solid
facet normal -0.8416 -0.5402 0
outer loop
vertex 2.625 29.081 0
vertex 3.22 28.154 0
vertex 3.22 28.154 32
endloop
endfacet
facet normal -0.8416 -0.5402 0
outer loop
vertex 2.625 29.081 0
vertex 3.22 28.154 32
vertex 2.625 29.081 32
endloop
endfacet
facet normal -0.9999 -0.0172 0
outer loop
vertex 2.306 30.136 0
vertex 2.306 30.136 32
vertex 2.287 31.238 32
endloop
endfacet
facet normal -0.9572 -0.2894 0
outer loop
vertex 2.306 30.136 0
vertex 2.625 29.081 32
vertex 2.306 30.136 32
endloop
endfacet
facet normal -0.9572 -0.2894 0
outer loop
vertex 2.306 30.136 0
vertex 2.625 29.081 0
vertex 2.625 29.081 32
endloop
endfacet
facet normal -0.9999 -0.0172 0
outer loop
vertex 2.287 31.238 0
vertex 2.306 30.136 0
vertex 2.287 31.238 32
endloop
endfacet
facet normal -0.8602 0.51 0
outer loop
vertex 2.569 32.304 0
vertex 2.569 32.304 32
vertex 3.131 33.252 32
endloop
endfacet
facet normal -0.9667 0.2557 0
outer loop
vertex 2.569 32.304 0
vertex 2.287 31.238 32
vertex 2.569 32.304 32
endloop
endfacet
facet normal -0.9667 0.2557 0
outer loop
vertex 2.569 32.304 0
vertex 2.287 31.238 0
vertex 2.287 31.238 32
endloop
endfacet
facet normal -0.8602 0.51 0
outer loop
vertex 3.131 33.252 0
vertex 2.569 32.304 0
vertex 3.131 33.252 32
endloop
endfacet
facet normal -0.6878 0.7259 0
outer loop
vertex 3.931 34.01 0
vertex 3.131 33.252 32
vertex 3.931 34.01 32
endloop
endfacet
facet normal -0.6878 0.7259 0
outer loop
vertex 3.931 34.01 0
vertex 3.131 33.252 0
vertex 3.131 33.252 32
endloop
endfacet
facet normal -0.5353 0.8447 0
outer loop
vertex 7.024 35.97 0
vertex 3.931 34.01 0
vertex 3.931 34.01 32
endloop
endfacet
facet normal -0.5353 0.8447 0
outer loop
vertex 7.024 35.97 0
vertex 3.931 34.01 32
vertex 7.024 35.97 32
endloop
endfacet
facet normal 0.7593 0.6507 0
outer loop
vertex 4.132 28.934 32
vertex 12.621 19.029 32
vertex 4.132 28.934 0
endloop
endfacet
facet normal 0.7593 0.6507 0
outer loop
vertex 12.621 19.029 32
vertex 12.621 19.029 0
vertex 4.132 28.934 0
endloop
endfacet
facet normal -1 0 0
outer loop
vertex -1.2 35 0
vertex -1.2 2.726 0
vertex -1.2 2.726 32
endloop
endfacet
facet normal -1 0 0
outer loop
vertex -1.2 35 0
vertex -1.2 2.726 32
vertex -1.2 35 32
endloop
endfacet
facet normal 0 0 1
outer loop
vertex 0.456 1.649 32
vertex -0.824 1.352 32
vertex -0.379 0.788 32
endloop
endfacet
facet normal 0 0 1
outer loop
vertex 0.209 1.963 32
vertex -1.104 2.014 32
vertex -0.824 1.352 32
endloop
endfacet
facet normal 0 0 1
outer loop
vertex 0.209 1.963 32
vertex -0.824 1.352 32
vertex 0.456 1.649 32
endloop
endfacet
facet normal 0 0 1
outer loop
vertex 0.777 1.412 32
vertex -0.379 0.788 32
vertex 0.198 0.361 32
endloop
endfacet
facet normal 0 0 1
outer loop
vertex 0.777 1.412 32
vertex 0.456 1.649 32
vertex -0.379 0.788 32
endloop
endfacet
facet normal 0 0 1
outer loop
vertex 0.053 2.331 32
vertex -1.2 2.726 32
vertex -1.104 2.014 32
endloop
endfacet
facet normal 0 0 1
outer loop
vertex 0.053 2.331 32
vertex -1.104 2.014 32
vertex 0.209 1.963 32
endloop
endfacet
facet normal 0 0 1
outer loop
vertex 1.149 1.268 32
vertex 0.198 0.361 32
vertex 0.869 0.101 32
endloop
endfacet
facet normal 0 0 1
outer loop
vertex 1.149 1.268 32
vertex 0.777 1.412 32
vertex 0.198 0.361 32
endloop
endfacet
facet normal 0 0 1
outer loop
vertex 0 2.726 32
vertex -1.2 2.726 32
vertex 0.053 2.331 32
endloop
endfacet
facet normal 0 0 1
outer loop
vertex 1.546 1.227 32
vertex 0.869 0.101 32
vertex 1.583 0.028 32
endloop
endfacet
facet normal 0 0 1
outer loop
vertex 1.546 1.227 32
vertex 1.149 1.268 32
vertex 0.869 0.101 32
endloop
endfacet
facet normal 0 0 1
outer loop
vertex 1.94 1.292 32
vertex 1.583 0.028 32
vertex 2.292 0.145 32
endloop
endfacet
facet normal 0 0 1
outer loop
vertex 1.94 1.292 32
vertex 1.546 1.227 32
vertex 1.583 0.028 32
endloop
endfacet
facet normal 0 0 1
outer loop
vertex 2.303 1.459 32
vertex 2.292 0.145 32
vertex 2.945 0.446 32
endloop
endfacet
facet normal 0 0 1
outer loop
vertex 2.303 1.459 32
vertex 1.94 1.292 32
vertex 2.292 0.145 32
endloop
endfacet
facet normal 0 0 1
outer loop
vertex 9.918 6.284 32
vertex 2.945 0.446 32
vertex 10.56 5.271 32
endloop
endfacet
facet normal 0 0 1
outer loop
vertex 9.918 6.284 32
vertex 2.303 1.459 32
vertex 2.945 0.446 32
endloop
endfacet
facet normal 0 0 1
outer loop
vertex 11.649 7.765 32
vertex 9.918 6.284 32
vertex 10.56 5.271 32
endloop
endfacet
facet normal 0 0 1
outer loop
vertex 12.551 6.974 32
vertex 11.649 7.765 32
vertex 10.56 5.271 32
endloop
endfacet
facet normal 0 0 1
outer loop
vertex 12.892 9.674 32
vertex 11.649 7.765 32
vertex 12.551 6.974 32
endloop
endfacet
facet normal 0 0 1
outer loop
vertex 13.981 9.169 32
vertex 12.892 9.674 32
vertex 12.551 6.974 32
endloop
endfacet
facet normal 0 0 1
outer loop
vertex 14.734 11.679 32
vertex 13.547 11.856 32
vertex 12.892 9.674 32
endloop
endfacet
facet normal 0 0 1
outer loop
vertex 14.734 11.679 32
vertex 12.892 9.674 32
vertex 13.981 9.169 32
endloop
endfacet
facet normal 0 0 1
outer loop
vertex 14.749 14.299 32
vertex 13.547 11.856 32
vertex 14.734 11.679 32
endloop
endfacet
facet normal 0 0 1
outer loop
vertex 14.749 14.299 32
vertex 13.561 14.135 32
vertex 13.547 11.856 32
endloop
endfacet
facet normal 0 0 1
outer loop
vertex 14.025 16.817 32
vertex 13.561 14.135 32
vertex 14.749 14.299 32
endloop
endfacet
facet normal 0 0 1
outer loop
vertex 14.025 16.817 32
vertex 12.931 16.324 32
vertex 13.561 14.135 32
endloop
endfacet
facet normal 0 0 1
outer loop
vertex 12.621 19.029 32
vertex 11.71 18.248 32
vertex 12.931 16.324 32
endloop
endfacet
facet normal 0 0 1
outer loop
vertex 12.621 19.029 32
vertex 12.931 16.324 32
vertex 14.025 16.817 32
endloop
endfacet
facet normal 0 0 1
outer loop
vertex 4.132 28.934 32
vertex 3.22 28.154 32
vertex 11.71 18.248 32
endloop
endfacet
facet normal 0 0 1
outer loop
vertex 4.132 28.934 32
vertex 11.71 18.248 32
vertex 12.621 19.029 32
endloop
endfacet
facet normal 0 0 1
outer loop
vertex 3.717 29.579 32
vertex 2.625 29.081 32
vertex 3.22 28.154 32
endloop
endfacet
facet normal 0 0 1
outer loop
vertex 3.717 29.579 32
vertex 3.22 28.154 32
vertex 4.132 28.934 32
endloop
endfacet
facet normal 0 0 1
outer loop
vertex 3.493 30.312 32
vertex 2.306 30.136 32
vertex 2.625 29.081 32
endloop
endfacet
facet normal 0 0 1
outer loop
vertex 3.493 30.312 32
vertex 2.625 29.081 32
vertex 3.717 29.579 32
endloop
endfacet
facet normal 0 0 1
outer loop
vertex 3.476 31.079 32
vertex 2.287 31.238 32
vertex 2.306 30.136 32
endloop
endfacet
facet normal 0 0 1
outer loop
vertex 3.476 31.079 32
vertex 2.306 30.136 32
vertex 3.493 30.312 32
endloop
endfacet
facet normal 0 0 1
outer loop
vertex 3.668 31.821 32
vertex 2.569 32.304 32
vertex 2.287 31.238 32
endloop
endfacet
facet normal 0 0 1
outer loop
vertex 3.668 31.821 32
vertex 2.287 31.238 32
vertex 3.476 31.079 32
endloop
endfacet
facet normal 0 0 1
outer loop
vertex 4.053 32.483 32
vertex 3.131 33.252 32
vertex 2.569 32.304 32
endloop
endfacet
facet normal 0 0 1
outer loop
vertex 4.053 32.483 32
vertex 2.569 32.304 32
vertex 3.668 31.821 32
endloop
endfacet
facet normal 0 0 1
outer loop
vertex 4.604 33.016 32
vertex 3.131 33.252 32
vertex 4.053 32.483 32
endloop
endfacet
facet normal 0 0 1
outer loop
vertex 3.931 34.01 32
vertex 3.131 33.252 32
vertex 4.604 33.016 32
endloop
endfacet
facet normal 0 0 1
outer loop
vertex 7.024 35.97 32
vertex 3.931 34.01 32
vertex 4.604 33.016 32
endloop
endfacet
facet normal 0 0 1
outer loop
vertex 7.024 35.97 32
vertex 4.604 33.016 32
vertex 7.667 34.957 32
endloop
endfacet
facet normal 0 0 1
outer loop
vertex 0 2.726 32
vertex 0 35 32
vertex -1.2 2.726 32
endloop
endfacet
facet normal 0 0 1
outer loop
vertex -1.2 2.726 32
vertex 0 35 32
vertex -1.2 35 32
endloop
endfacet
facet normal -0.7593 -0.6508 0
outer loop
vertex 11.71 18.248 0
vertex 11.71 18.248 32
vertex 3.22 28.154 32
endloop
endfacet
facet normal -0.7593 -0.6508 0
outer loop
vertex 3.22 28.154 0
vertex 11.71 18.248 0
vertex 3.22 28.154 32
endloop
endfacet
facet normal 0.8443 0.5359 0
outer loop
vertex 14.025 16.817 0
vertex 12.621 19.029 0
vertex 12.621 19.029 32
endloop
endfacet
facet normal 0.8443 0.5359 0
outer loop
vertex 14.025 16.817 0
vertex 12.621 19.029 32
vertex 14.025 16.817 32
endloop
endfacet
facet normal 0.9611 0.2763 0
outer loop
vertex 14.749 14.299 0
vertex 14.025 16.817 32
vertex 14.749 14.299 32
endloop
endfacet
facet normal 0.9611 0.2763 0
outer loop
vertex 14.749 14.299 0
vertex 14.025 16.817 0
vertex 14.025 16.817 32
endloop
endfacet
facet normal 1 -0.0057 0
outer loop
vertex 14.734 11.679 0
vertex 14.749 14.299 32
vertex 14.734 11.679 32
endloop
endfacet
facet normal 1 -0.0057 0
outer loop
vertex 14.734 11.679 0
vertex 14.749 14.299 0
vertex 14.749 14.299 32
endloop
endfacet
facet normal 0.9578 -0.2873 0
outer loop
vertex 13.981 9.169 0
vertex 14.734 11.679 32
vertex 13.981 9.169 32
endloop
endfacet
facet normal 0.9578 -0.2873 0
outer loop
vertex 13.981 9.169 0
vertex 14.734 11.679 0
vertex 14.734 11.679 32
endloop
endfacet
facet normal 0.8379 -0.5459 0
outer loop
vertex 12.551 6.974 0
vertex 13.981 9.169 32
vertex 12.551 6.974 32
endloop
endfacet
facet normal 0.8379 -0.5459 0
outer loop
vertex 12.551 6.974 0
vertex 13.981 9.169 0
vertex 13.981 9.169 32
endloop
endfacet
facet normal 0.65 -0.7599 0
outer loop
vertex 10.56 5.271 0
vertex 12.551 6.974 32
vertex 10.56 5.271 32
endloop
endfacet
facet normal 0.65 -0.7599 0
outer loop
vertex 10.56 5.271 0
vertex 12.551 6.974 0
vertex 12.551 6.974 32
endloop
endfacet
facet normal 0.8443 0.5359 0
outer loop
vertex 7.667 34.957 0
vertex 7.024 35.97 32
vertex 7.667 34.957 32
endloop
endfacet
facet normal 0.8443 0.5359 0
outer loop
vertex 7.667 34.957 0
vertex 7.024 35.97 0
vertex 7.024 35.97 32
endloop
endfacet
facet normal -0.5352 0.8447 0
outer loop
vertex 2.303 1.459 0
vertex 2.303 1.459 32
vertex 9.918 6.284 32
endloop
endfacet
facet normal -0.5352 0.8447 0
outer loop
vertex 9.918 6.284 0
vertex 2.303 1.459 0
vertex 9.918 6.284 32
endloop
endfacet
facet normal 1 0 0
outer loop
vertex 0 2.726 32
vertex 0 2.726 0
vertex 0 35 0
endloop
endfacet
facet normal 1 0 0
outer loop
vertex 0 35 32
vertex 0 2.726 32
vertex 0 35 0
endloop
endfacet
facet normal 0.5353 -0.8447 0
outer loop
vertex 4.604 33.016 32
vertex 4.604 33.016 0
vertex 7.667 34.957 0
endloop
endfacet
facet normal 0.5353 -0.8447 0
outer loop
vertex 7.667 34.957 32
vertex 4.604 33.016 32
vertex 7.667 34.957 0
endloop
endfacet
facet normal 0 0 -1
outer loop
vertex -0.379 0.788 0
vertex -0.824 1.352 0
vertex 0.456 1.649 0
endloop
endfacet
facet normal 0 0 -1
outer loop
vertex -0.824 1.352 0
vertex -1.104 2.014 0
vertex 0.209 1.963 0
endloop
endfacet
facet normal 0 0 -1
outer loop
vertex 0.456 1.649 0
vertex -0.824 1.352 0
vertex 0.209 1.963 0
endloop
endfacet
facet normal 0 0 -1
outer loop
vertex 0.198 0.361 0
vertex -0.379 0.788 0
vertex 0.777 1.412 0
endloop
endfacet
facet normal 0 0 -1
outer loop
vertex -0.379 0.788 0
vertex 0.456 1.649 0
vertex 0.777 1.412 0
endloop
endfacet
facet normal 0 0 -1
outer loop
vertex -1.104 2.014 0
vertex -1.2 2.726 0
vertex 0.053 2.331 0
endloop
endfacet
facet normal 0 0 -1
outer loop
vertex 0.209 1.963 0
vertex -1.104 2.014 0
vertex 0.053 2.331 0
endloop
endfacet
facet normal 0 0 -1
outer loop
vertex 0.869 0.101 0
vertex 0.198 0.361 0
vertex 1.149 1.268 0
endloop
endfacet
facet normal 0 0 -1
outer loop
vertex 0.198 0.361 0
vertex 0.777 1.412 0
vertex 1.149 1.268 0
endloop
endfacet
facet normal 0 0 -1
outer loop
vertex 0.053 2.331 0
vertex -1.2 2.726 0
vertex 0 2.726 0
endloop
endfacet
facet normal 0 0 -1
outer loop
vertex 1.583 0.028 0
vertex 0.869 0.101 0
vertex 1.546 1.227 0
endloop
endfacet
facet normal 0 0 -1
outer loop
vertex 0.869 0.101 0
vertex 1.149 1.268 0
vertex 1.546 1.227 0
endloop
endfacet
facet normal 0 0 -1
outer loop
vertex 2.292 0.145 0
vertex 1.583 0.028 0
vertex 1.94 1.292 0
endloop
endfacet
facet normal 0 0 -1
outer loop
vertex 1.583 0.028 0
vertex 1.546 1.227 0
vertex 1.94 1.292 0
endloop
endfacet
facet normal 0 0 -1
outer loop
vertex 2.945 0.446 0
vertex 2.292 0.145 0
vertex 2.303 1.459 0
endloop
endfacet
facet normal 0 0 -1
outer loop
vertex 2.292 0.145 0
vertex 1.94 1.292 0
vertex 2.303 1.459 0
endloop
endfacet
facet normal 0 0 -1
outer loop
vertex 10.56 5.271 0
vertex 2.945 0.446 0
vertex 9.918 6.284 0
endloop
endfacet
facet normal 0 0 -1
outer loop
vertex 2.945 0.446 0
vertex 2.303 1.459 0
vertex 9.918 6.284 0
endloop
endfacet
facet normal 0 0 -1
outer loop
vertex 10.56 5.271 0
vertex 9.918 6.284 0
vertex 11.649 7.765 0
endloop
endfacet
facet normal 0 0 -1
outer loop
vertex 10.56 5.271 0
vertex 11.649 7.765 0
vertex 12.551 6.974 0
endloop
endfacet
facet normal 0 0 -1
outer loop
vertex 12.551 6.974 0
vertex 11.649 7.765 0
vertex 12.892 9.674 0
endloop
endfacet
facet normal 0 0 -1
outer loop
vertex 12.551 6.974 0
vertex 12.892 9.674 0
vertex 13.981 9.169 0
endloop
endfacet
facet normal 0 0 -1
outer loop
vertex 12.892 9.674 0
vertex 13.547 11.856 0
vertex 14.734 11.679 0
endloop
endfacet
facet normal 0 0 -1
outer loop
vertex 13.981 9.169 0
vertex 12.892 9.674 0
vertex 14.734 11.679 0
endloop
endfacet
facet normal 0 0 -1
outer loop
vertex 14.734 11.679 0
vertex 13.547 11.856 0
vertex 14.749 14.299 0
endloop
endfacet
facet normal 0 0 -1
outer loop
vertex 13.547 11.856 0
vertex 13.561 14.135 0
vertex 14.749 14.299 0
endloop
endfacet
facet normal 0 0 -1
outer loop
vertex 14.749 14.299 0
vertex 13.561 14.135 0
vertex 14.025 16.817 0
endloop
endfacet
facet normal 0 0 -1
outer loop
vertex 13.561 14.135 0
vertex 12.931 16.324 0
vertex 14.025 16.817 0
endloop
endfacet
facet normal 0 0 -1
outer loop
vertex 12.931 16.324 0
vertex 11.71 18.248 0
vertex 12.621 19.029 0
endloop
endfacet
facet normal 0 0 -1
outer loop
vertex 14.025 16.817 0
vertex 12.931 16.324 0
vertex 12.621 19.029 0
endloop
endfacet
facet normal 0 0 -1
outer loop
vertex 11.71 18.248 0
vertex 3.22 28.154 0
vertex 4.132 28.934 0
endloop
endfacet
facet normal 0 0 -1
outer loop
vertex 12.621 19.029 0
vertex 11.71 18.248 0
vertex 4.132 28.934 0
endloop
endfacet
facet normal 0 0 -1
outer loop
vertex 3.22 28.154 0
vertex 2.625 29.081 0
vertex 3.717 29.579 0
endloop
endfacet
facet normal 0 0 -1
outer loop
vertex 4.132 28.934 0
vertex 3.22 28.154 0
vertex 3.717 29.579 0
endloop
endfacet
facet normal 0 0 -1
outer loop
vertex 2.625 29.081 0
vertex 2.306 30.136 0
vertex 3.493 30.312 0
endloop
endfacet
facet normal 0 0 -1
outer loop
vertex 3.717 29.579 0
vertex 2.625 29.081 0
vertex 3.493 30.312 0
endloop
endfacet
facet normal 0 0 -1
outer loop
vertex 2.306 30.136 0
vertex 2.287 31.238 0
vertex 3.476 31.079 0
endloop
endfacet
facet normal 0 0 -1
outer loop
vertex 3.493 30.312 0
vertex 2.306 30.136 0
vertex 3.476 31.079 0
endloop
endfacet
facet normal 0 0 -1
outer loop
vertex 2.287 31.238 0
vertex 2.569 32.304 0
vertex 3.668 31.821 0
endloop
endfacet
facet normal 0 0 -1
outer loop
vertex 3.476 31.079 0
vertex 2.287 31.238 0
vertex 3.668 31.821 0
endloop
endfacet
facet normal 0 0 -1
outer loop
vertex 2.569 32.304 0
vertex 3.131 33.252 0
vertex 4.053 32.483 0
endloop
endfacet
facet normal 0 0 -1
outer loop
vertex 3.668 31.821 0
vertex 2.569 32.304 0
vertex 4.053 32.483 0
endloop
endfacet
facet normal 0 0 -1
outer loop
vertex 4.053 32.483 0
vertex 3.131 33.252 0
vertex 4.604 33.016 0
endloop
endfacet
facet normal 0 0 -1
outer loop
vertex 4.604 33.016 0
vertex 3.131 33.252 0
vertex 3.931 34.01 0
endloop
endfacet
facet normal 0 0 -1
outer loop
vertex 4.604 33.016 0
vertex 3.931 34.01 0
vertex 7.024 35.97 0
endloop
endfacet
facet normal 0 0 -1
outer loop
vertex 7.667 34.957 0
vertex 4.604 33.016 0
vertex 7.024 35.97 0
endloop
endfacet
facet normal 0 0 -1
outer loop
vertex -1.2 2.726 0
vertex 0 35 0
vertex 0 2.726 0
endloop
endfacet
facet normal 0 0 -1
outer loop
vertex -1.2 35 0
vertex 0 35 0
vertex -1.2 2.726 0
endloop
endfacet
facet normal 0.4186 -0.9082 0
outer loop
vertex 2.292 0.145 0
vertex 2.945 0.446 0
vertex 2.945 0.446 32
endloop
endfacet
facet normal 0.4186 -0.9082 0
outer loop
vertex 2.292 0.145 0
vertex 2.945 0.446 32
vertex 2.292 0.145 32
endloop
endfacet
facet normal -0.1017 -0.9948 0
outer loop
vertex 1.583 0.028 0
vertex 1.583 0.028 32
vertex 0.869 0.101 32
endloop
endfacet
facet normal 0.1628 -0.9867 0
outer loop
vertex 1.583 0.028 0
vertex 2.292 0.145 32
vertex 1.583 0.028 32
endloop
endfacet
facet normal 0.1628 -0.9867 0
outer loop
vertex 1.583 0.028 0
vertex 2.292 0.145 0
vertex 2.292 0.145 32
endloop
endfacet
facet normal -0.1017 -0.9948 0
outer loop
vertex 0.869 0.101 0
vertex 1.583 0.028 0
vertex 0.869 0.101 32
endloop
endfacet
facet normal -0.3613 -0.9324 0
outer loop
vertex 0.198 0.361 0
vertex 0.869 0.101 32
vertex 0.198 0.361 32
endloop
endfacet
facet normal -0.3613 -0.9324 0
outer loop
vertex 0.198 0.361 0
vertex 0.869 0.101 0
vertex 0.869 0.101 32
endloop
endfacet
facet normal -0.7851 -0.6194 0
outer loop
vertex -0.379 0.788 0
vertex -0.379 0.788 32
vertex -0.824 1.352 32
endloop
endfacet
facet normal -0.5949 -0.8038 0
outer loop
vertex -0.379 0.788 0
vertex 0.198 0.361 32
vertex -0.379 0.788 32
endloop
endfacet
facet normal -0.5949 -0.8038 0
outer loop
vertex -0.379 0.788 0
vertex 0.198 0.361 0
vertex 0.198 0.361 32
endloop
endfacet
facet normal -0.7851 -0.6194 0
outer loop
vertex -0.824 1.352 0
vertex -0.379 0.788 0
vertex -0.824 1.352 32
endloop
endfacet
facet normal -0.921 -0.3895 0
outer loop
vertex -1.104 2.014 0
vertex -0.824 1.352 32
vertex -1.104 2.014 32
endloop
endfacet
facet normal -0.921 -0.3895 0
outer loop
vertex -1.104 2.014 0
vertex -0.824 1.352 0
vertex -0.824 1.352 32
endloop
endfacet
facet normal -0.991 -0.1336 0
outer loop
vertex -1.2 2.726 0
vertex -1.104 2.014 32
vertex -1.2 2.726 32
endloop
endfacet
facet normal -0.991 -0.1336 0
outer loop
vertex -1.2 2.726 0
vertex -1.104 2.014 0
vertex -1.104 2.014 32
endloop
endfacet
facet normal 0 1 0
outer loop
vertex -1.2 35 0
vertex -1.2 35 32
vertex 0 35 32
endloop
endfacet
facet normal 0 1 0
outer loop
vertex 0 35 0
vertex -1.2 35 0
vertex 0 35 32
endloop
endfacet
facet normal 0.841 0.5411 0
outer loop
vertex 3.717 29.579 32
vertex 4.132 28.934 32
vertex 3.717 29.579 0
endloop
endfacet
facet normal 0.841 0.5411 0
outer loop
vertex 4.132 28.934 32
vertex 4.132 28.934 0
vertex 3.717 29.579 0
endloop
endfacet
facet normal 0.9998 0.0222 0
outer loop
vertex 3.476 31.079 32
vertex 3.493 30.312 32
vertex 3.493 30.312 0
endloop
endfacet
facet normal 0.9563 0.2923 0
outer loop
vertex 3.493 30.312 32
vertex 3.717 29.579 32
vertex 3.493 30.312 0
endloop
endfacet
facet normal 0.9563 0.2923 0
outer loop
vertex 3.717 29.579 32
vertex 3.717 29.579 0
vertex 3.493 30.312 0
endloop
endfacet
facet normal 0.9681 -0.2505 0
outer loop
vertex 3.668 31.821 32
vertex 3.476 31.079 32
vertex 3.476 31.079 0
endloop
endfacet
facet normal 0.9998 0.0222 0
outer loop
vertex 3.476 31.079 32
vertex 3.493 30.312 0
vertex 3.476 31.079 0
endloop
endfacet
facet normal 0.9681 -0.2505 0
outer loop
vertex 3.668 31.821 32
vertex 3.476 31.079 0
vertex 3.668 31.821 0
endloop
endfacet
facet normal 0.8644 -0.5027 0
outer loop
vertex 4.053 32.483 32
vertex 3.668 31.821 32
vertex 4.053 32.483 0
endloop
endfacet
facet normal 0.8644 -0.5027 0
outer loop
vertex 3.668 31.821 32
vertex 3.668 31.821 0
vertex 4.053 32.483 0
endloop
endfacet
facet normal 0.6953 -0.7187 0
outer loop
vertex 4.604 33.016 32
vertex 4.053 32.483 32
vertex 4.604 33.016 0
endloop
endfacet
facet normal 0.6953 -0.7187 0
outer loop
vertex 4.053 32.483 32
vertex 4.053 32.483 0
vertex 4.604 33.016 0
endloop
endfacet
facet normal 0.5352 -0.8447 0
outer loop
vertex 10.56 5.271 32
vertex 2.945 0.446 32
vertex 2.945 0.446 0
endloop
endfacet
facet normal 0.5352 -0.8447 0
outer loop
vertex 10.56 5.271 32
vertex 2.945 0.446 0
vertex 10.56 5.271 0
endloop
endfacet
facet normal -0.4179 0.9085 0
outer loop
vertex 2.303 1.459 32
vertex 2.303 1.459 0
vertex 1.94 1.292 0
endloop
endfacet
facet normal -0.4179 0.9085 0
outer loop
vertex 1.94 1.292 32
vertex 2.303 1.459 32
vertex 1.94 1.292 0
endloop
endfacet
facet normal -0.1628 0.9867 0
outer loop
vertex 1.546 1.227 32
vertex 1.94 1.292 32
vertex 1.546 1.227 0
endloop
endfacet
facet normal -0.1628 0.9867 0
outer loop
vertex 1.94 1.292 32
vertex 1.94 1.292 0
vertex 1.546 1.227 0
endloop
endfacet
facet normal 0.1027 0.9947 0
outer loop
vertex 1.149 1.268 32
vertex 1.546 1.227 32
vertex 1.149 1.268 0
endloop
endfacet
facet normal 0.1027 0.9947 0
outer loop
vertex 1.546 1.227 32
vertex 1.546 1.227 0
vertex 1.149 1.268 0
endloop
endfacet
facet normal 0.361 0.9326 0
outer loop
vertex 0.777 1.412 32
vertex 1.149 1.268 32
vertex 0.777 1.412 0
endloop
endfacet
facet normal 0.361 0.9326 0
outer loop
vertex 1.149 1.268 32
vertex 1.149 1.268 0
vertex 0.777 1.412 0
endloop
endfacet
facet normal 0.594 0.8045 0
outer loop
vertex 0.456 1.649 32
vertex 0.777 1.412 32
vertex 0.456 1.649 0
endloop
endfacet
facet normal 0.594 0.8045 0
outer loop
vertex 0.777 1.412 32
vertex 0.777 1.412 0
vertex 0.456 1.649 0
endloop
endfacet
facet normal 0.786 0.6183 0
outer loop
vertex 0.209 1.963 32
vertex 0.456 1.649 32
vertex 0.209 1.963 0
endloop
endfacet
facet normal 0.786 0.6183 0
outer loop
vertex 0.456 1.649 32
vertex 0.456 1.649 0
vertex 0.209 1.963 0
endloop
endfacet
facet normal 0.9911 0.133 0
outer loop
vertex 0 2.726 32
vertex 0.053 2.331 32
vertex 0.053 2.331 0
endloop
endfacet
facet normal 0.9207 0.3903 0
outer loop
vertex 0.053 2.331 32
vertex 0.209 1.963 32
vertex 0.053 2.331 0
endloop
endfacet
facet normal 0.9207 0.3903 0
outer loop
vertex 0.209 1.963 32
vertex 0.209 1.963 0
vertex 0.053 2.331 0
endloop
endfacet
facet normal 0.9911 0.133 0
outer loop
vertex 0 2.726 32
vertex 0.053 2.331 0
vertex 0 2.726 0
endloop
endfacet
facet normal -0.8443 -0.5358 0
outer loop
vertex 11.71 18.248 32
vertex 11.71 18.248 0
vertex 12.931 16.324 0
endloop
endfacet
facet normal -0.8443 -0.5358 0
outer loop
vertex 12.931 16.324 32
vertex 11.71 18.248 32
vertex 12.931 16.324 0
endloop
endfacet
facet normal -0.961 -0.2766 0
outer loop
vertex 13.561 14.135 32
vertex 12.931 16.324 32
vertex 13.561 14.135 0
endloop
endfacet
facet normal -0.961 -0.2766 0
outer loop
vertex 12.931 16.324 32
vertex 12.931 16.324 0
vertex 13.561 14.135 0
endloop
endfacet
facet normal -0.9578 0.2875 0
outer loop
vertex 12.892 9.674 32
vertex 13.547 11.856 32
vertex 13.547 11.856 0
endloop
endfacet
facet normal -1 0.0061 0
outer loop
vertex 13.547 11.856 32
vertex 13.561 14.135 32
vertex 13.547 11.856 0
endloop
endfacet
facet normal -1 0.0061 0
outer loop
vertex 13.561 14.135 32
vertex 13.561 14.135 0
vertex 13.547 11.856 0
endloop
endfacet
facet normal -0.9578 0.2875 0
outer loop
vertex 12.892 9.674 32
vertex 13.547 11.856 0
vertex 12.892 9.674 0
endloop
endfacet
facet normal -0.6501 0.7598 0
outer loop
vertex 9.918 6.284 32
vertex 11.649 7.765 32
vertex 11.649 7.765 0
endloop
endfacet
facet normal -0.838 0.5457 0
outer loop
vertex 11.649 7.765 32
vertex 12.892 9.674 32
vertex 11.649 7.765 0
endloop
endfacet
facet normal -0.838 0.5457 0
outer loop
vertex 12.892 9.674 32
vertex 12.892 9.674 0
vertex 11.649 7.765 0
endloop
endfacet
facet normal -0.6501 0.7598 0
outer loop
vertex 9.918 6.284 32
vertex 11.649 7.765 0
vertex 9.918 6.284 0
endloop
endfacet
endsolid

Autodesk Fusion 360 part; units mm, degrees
sketch "Sketch1" plane through (0, 0, 0) normal (0, 0, 1) x (1, 0, 0)
  line L0 (0, 2.7263) -> (0, 35)
  line L1 (2.3029, 1.4592) -> (9.9175, 6.2842)
  arc A0 (9.9175, 6.2842) -> (11.71, 18.2478) centre (5.6356, 13.0418) ccw
  line L2 (11.71, 18.2478) -> (3.2204, 28.1536)
  arc A1 (3.9309, 34.0102) -> (3.2204, 28.1536) centre (6.2576, 30.7565) ccw
  line L3 (3.9309, 34.0102) -> (7.0243, 35.9704)
  line L4 (-1.2, 35) -> (0, 35)
  line L5 (7.0243, 35.9704) -> (7.6666, 34.9567)
  arc A2 (0, 2.7263) -> (2.3029, 1.4592) centre (1.5, 2.7263) ccw
  line L6 (4.6041, 33.0162) -> (7.6666, 34.9567)
  arc A3 (4.6041, 33.0162) -> (4.1316, 28.9345) centre (6.2576, 30.7565) ccw
  line L7 (12.6211, 19.0286) -> (4.1316, 28.9345)
  arc A4 (10.5598, 5.2706) -> (12.6211, 19.0286) centre (5.6356, 13.0418) ccw
  line L8 (2.9452, 0.4456) -> (10.5598, 5.2706)
  arc A5 (-1.2, 2.7263) -> (2.9452, 0.4456) centre (1.5, 2.7263) ccw
  line L9 (-1.2, 2.7263) -> (-1.2, 35)
  dimension "d1" = 35
  dimension "d2" = 8
  dimension "d3" = 4
  dimension "d4" = -1.2
  dimension "d7" = 1.5
extrude "Extrude1" add sketch "Sketch1" along normal blind 32
